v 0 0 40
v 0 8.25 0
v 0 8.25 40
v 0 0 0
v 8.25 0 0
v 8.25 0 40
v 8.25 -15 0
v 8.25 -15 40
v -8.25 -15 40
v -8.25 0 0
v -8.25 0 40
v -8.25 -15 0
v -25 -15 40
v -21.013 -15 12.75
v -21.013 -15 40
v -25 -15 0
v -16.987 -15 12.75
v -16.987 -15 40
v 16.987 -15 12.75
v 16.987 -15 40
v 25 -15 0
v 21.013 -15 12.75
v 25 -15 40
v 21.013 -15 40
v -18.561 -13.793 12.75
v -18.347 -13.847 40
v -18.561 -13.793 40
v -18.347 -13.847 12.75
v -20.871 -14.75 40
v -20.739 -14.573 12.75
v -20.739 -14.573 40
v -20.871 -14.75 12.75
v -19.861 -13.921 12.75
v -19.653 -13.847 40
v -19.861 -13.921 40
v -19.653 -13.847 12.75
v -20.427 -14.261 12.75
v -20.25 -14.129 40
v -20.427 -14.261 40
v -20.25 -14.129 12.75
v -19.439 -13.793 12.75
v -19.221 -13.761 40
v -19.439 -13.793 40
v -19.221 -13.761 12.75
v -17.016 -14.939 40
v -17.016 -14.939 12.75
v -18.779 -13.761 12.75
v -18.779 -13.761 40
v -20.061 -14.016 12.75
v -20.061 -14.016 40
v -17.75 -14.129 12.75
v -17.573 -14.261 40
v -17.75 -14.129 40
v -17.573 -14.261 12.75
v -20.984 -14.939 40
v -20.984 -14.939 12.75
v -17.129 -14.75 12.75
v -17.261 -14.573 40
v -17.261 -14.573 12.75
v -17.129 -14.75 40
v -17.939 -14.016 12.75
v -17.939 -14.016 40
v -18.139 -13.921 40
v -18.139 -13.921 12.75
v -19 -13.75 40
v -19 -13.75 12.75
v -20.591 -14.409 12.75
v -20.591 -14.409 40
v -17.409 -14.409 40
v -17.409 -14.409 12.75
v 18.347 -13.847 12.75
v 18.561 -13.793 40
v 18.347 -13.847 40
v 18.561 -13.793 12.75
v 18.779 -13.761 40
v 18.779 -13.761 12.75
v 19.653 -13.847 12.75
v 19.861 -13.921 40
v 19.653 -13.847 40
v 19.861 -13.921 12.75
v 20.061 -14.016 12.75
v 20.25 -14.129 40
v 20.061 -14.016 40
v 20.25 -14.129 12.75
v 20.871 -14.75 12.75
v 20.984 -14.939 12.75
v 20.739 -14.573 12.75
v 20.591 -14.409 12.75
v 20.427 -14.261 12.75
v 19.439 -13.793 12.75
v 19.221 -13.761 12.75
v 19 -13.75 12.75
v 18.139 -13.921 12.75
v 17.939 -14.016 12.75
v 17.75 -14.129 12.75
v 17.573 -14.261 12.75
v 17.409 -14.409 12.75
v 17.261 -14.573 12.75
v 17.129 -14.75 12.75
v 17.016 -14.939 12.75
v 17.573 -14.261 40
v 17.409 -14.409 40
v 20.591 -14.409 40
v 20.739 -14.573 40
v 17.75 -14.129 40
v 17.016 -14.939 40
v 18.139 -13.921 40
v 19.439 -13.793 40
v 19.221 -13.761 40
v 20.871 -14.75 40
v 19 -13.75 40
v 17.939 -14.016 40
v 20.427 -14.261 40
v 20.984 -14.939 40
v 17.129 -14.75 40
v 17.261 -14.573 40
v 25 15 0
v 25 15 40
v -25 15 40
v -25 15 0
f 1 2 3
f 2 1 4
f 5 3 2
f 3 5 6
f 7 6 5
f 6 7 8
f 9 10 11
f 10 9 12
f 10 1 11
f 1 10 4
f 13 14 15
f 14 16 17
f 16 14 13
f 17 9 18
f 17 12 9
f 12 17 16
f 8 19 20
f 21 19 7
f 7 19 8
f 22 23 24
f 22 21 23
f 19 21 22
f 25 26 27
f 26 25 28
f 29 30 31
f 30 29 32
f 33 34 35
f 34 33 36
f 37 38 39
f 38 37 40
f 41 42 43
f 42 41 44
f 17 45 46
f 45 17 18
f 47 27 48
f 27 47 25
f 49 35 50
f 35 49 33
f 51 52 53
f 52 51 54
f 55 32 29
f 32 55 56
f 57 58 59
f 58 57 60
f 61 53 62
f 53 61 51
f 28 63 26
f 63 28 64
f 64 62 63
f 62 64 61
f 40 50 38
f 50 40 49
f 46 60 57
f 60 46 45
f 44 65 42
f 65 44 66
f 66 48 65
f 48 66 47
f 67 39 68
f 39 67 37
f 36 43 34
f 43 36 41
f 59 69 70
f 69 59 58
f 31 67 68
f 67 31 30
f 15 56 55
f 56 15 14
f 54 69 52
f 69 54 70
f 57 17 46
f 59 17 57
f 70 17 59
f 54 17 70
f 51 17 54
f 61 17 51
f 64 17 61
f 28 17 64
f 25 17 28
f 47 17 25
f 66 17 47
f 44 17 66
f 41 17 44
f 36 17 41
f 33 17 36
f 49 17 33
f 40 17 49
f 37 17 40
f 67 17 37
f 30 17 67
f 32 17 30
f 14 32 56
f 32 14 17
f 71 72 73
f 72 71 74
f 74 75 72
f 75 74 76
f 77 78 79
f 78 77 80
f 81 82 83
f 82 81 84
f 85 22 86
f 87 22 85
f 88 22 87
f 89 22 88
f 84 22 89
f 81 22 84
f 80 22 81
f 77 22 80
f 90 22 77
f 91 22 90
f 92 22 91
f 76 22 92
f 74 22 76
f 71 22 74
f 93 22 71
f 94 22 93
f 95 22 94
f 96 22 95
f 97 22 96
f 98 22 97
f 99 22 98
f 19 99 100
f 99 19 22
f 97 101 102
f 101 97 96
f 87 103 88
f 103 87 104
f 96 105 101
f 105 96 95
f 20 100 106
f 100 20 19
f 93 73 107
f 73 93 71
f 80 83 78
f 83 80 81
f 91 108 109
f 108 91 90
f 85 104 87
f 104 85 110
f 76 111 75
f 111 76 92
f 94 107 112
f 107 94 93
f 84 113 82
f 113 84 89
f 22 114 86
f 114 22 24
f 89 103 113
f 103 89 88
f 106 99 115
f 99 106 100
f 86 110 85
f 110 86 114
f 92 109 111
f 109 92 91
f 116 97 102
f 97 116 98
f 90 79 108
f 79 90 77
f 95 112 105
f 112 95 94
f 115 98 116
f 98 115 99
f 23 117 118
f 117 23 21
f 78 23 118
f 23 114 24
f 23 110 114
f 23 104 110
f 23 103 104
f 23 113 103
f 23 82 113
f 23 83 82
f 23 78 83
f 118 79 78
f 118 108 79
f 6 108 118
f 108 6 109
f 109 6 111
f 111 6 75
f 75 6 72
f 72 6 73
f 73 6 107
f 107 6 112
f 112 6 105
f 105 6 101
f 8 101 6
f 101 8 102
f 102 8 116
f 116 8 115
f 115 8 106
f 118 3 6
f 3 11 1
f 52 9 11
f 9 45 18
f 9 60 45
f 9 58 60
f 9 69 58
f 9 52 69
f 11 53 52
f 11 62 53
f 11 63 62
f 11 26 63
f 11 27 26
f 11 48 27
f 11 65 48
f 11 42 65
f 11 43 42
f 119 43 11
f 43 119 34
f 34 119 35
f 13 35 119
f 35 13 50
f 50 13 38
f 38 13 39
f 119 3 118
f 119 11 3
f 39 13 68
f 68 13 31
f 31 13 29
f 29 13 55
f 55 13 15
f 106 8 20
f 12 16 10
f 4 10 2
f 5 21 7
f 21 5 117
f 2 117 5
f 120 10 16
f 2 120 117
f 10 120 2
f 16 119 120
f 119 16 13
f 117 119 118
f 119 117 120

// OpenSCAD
// Wall-mounted 10 mL syringe holder
// Print orientation: block stands on the bed (z=0), back face (y=+15) against wall.
// Centred on origin in X and Y.

$fn = 64;

// ---- Block dimensions (measured with calipers) ----
block_w = 50;   // X width
block_d = 30;   // Y depth
block_h = 40;   // Z height

// ---- Barrel channel (16.5 mm wide vertical slot, full height) ----
barrel_w   = 16.5;
barrel_r   = barrel_w / 2;          // 8.25 mm half-circle radius
barrel_cx  = 0;                     // centre x of the half-circle
barrel_cy  = 0;                     // centre y of the half-circle (back end)
barrel_yf  = -block_d / 2;          // front face y = -15 (straight sides run to here)

// ---- Finger-flange slot (34 mm wide, 2.6 mm tall, z 30..32.6, from front to y=11) ----
flange_w   = 34;
flange_h   = 2.6;
flange_z0  = 30;
flange_yb  = 11;                    // back end of the slot

// ---- M4 wall-screw clearance holes (4.5 mm, through front-to-back) ----
screw_d    = 4.5;
screw_x    = 19;                    // holes at x = -19 and +19
screw_z    = 15;

// ---- Base solid: block standing on the bed, centred in X and Y ----
module base() { translate([-block_w/2, -block_d/2, 0])
      cube([block_w, block_d, block_h]); }

// ---- Barrel channel: half-circle (back) + straight sides (to front face) ----
// The half-circle is centred at (0,0) and opens toward the front (negative Y).
// The straight sides run from y=0 to y=-15, so the channel is a full-height slot.
module barrel_channel() { union() {
    // Half-circle (back end), centred at (0,0), opening toward -Y
    translate([barrel_cx, barrel_cy, -1])
        linear_extrude(height = block_h + 2)
            polygon([
                [ 0,  0],
                [ 0,  barrel_r],
                [ barrel_r,  0],
                [ 0, -barrel_r],
                [-barrel_r,  0],
                [ 0, -barrel_r]
            ]);
    // Straight sides from y=0 to y=-15 (front face), full height
    translate([-barrel_w/2, barrel_yf, -1])
        cube([barrel_w, -barrel_yf, block_h + 2]);
} }

// ---- Finger-flange slot: 34 mm wide, 2.6 mm tall, z 30..32.6, y -15..11 ----
module flange_slot() { translate([-flange_w/2, flange_yb, flange_z0])
             cube([flange_w, -block_d/2 - flange_yb, flange_h]); }

// ---- M4 screw clearance holes: 4.5 mm dia, through front-to-back (along Y) ----
module screw_holes() { for (sx = [-screw_x, screw_x])
    translate([sx, -block_d/2 - 1, screw_z - screw_d/2])
        cylinder(h = block_d + 2, r = screw_d/2, $fn = $fn); }

// ---- Final part ----
difference() {
    base();
    barrel_channel();
    flange_slot();
    screw_holes();
}
